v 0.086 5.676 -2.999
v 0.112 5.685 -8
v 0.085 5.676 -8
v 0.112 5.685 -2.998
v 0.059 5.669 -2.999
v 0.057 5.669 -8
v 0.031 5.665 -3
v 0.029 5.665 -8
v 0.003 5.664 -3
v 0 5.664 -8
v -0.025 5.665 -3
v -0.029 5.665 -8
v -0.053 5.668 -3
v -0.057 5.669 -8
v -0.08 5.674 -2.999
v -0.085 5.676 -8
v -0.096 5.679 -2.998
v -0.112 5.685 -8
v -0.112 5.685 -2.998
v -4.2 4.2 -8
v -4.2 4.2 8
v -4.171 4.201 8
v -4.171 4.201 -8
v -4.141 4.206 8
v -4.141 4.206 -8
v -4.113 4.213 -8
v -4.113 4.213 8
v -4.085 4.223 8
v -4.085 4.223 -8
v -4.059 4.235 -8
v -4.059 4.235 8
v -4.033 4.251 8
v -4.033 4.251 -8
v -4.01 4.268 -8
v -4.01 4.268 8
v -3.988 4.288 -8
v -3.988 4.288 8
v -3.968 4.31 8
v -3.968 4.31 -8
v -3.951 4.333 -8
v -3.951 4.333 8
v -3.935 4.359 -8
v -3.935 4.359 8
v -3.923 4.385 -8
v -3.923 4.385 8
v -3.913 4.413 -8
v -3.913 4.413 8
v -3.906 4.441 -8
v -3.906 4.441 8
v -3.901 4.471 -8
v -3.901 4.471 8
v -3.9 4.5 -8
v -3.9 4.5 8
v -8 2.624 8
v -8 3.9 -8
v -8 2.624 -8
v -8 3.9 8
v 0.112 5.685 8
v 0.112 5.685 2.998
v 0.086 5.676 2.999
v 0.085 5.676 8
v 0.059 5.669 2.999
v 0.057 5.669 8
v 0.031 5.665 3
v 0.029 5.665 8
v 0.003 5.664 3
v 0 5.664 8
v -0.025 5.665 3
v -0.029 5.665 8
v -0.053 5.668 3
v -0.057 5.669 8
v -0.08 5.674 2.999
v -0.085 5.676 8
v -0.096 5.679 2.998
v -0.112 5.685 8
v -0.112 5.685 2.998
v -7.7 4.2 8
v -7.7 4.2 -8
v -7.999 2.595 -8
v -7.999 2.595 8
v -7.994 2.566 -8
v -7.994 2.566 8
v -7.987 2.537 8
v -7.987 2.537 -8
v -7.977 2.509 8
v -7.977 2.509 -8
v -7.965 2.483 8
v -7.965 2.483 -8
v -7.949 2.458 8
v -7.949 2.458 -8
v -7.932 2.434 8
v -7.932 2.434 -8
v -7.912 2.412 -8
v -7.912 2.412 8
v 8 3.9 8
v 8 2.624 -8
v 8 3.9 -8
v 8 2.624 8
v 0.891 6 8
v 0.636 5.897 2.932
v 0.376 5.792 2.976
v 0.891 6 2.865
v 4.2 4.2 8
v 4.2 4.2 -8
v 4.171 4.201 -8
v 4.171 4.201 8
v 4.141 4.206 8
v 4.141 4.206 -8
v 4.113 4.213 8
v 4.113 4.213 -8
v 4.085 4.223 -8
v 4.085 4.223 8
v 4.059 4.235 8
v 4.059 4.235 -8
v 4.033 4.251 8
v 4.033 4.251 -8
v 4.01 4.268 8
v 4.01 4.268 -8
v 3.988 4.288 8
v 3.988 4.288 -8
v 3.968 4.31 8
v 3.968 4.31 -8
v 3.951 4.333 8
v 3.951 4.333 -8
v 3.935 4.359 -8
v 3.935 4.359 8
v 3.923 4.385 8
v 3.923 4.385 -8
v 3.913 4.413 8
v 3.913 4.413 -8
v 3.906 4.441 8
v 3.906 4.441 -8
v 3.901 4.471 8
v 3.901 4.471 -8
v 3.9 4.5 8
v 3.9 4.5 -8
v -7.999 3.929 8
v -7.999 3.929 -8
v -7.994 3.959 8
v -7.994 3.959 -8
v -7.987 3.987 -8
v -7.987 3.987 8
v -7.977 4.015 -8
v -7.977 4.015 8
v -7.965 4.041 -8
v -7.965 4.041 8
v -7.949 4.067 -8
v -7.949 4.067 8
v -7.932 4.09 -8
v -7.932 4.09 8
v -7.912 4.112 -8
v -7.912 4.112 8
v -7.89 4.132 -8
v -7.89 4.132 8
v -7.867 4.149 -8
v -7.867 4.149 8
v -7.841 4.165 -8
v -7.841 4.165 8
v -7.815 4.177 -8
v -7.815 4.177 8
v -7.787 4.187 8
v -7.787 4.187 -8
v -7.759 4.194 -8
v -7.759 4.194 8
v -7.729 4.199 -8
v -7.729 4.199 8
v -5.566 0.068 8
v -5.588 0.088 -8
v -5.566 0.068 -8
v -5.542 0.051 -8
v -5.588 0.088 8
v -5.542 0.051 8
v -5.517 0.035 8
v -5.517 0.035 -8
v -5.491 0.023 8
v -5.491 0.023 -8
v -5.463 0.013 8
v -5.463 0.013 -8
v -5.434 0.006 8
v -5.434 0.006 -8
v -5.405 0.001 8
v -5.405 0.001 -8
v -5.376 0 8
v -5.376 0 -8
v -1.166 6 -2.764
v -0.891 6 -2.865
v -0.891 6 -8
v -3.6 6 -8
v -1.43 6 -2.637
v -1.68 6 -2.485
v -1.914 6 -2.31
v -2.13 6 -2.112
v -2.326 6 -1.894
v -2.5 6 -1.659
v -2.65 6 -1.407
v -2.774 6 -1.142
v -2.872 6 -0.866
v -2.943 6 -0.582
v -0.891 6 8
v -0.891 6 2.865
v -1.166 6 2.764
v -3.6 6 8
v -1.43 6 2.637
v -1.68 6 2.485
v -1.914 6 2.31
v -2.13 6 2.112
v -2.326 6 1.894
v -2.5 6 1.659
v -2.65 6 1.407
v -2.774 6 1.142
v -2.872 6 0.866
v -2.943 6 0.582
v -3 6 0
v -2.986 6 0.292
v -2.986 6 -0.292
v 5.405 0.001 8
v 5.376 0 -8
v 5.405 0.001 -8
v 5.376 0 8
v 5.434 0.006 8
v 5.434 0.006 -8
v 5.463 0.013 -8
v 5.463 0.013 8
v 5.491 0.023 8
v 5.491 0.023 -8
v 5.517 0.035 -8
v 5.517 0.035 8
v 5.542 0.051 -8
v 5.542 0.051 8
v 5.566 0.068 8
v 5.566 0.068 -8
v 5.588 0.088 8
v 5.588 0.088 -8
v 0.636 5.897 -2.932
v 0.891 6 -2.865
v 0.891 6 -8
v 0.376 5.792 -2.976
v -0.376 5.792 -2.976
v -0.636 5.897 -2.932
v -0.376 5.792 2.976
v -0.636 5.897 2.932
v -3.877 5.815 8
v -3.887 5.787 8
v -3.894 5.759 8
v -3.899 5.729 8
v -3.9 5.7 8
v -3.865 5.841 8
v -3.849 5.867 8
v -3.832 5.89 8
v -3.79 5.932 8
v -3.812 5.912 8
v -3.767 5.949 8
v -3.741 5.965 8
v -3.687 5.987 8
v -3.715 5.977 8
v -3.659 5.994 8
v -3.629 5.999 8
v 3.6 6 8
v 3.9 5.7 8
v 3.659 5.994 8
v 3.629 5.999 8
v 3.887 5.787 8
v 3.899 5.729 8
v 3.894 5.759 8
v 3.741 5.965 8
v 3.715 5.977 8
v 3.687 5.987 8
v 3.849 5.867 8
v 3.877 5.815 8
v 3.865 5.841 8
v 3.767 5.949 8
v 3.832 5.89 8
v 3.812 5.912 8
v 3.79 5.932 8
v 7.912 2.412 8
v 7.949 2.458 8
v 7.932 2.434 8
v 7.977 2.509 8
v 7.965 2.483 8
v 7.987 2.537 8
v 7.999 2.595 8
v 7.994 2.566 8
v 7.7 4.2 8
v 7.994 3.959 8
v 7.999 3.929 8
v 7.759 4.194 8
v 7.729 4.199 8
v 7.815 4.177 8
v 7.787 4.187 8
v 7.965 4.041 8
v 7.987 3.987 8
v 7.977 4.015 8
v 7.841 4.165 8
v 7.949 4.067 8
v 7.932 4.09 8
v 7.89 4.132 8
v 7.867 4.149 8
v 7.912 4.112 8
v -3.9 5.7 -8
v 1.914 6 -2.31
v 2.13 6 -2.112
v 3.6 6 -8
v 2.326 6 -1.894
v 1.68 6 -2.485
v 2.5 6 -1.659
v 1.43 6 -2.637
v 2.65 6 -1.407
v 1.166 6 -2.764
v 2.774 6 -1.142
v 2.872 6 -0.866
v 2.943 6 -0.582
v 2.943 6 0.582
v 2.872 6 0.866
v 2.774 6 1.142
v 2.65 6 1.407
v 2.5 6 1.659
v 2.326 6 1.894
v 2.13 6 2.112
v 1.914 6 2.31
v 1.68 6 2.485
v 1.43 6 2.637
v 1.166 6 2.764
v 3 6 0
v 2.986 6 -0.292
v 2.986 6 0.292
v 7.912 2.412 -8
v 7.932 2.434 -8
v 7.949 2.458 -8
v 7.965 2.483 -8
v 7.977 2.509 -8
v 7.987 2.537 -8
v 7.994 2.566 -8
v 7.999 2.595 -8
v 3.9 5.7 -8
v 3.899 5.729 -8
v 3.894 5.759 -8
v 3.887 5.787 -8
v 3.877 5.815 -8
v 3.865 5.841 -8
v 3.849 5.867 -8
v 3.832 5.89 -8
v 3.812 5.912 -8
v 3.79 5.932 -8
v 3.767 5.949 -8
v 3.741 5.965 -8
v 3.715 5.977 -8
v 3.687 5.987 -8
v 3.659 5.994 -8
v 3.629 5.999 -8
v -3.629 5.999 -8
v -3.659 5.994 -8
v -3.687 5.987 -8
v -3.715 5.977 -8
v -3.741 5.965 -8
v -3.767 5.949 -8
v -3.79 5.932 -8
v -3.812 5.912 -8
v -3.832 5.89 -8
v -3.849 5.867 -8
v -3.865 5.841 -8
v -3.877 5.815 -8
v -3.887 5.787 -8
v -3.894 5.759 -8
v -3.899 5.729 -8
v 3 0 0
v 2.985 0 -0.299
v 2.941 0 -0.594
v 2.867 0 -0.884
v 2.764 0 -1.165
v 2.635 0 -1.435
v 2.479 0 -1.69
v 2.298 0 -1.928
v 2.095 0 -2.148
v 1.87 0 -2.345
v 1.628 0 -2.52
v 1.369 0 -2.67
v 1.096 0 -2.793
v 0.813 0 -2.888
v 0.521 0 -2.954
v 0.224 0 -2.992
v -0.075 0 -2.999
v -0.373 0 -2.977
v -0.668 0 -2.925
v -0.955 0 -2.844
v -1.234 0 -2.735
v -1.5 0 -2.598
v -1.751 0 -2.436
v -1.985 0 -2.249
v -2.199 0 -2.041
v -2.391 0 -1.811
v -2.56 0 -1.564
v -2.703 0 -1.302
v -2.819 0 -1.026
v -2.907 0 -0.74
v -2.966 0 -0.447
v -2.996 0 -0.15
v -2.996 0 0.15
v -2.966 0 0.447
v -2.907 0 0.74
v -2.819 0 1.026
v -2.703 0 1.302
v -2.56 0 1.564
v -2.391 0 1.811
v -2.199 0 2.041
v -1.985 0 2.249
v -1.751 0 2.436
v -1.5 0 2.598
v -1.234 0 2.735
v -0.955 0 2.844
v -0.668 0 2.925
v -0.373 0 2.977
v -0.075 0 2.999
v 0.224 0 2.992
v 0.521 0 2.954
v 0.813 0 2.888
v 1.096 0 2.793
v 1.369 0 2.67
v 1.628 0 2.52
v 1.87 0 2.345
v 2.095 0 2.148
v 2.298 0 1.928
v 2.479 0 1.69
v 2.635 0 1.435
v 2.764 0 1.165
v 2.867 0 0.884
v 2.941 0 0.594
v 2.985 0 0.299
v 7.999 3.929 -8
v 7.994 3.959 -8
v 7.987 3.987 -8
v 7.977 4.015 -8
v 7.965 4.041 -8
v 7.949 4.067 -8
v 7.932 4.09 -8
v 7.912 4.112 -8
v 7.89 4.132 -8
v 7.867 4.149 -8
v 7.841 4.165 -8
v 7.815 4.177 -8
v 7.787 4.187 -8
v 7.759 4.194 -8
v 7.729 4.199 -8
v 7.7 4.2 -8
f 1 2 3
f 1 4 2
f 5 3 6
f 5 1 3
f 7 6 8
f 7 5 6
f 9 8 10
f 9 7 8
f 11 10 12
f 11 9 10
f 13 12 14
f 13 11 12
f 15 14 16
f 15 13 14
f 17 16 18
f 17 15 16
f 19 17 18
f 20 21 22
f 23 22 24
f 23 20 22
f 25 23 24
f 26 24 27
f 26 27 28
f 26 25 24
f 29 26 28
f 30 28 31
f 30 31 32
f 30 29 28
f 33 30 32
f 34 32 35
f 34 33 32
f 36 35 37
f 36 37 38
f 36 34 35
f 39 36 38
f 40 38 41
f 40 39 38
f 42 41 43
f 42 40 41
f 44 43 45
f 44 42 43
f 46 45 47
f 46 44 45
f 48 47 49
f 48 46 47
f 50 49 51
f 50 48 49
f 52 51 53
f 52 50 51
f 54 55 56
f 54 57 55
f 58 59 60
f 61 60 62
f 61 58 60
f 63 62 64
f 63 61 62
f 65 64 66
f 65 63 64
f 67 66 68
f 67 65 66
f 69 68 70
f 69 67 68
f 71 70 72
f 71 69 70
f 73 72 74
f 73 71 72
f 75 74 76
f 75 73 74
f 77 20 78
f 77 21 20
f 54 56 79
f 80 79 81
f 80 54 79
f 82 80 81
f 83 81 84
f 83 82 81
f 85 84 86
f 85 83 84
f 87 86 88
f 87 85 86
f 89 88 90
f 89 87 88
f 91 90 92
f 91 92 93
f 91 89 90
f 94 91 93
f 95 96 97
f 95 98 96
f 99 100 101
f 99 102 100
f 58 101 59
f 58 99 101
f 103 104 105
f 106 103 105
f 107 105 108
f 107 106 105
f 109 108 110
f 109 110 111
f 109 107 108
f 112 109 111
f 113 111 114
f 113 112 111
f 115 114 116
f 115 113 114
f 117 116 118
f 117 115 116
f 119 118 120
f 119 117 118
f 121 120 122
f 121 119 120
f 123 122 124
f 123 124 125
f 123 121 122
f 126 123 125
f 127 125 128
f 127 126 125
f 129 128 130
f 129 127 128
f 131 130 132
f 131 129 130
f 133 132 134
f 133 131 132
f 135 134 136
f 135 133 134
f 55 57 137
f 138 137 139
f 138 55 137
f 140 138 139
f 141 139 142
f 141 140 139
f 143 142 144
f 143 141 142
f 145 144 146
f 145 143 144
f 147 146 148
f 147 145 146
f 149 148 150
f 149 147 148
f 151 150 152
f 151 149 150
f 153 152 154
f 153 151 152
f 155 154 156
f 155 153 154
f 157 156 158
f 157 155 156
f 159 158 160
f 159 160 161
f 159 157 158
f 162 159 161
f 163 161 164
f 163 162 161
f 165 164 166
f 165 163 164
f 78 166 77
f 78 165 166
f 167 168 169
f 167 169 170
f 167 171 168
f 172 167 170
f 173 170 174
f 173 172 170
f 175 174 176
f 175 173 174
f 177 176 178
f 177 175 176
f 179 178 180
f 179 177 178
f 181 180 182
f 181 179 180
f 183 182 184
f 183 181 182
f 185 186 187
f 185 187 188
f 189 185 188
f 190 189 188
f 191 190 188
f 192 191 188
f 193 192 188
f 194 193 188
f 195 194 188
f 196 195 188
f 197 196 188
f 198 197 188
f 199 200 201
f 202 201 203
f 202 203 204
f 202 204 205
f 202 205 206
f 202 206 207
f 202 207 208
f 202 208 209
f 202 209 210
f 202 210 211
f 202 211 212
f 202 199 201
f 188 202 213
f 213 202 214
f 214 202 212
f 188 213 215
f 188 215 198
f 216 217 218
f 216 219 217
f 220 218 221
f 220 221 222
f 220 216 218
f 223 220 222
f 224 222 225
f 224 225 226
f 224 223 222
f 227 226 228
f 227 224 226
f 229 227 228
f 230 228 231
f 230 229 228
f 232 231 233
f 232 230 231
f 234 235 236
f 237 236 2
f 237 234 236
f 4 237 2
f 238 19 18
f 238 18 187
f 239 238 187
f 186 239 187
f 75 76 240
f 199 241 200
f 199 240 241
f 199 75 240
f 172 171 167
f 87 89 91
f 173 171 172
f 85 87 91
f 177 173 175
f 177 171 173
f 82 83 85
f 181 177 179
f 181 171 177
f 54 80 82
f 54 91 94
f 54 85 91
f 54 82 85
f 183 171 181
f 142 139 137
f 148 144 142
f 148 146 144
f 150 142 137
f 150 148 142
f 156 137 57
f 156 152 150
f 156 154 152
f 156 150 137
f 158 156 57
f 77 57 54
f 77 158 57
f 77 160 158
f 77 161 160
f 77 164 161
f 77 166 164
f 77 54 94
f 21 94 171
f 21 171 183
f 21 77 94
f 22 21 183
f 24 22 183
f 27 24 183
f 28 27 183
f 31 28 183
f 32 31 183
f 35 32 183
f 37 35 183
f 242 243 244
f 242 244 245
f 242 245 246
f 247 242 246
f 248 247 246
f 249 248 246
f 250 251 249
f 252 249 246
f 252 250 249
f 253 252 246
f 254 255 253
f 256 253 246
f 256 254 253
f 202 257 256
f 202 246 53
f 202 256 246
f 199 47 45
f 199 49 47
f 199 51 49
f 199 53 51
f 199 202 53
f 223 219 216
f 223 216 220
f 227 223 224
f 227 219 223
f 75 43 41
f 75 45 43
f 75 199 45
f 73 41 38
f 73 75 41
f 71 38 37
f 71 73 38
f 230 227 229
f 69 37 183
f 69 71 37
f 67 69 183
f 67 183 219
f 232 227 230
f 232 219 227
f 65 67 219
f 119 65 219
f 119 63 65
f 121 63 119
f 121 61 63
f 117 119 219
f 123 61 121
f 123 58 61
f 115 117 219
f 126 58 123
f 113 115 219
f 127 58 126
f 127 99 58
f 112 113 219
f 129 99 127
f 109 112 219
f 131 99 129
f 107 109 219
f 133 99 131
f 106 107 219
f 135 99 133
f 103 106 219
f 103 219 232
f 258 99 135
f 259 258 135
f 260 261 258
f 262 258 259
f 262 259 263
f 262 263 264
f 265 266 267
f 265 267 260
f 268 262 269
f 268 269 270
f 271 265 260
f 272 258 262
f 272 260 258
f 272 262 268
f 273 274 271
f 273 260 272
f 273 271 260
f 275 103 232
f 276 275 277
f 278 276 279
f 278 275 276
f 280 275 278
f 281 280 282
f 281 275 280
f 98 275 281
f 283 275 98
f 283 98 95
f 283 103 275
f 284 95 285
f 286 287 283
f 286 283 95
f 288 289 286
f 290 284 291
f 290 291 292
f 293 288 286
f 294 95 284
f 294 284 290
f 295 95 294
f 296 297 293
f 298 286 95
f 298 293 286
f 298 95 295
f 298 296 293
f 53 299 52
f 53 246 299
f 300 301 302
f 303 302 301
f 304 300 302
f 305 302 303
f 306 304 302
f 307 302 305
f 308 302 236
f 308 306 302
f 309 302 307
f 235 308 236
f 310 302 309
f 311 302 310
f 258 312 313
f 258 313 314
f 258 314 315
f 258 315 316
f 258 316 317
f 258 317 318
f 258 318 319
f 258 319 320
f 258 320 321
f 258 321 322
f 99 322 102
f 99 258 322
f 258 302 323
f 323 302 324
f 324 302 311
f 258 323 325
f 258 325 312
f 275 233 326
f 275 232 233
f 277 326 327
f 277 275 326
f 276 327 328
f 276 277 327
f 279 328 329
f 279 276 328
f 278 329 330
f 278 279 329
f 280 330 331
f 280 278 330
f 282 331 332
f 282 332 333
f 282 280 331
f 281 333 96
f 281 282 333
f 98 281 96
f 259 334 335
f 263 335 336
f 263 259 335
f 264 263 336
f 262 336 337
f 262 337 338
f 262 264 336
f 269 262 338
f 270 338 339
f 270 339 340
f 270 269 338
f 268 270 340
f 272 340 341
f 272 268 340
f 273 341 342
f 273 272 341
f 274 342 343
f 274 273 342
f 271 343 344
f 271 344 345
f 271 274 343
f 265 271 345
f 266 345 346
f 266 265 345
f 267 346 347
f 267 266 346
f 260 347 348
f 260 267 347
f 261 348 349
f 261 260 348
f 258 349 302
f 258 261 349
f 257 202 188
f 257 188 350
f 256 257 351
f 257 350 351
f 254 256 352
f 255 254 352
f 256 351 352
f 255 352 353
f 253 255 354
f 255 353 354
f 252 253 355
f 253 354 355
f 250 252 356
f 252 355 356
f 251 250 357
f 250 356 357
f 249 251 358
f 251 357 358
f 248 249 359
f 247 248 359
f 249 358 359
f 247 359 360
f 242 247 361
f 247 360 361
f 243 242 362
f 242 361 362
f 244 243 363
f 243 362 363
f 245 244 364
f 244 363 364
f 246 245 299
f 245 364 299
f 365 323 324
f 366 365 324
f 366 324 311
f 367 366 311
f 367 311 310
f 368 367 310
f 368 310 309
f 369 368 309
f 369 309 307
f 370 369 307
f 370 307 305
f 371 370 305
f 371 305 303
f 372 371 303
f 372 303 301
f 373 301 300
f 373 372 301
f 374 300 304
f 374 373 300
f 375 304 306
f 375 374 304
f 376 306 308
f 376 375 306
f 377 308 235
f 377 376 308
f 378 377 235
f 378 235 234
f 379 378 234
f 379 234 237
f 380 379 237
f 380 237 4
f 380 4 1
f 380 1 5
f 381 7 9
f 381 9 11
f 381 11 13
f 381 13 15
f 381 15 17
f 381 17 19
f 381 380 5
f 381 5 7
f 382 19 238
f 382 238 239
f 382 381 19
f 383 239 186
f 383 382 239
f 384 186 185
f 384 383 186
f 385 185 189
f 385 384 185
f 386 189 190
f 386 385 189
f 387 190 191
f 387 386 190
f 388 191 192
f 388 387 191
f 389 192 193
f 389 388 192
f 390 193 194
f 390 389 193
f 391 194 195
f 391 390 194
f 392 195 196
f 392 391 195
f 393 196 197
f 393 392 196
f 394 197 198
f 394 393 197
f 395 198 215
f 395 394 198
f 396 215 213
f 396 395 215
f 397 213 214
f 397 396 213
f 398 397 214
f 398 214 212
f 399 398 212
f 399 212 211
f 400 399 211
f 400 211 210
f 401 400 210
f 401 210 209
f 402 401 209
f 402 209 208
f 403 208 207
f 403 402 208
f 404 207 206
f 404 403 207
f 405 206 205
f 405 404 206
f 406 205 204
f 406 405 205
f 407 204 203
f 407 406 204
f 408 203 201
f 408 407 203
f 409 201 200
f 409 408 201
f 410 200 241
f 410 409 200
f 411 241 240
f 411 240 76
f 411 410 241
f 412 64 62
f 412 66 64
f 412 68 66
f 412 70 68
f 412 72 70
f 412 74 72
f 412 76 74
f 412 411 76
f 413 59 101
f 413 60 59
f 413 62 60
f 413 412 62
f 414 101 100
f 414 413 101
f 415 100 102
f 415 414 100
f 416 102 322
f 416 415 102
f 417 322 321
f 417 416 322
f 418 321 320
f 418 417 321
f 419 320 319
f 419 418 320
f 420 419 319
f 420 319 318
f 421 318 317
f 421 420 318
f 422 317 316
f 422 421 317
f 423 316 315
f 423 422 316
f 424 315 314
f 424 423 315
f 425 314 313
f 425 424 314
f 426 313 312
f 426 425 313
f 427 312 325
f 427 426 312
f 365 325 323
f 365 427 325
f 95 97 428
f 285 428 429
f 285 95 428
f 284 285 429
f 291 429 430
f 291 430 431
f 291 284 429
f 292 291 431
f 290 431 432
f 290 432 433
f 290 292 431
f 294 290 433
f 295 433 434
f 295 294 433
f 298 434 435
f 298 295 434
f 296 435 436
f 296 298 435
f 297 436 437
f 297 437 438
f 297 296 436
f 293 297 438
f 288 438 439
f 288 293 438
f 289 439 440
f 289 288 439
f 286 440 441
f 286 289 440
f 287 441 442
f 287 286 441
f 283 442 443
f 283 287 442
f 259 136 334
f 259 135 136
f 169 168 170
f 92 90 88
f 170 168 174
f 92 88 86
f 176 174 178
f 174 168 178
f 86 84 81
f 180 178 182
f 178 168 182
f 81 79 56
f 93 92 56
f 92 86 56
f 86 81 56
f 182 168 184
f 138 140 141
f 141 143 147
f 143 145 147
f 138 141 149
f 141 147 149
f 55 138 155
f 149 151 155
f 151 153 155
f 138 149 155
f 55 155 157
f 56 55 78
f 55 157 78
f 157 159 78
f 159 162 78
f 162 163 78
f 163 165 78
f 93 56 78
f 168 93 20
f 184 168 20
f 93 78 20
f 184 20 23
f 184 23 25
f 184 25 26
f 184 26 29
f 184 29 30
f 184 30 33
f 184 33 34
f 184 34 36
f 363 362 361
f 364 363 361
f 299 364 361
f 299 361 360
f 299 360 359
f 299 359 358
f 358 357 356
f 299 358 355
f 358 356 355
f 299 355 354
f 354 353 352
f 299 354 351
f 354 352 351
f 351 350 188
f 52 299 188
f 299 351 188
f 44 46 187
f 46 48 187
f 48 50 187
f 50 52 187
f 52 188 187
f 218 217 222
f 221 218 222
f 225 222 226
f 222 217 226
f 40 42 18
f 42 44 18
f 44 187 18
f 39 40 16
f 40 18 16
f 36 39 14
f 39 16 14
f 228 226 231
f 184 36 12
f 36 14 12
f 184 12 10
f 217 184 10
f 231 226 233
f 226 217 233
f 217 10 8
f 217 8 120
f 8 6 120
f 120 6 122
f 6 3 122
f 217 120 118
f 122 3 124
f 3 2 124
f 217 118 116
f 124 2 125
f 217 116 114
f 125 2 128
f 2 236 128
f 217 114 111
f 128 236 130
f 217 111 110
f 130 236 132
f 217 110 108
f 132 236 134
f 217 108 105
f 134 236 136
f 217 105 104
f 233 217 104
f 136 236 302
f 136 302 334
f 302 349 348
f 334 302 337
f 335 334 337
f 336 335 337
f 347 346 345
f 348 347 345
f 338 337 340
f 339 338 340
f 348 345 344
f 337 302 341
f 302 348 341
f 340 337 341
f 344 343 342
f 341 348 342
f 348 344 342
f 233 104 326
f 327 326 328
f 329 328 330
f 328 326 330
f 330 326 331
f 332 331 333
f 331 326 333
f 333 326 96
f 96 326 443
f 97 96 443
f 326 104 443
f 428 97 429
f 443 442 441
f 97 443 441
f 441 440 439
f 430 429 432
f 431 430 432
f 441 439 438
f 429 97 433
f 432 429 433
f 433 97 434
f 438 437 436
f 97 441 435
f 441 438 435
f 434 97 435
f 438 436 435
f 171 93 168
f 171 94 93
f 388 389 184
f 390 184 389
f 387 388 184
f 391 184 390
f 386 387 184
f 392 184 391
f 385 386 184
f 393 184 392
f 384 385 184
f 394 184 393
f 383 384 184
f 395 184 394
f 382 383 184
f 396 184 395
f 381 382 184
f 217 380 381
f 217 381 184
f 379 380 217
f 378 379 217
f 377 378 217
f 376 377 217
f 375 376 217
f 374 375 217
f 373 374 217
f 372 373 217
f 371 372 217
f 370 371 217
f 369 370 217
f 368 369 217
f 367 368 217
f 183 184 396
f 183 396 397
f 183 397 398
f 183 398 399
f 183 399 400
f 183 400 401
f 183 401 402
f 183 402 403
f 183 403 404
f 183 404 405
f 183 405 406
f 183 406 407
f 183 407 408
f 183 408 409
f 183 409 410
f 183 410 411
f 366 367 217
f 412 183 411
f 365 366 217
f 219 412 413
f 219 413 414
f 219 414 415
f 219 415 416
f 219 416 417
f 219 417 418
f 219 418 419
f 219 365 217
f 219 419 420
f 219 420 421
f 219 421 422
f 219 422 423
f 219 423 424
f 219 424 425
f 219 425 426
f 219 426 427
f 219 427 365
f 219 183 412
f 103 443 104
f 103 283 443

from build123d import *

# Parameters (mm, degrees)
BOSS_EXTRUDE1_DEPTH      = 8
BOSS_EXTRUDE1_DEPTH_BACK = 8
SKETCH9_R                = 3
CUT_EXTRUDE2_DEPTH       = 7
FILLET1_R                = 0.3


with BuildPart() as part:
    # Sketch4 → Boss-Extrude1 (new body, two sides)
    with BuildSketch(Plane.XY) as boss_extrude1_sk:
        Polygon((-8, 4.2), (-8, 2.5), (-5.5, 0), (5.5, 0), (8, 2.5), (8, 4.2), (3.9, 4.2), (3.9, 6), (0.891031267, 6), (0, 5.64), (-0.891031267, 6), (-3.9, 6), (-3.9, 4.2), align=None)
    extrude(amount=BOSS_EXTRUDE1_DEPTH)
    extrude(boss_extrude1_sk.sketch, amount=-BOSS_EXTRUDE1_DEPTH_BACK)

    # Sketch9 → Cut-Extrude2 (cut, through all)
    with BuildSketch(Plane(origin=(0, 0, 0), x_dir=(1, 0, 0), z_dir=(0, 1, 0))):
        Circle(SKETCH9_R)
    extrude(amount=CUT_EXTRUDE2_DEPTH, mode=Mode.SUBTRACT)

    # Fillet1
    fillet1_edges = [part.edges().sort_by_distance(p)[0] for p in [
        (-3.9, 6, 0),
        (-3.9, 4.2, 0),
        (-8, 4.2, 0),
        (-8, 2.5, 0),
        (-5.5, 0, 0),
        (5.5, 0, 0),
        (8, 2.5, 0),
        (8, 4.2, 0),
        (3.9, 4.2, 0),
        (3.9, 6, 0),
        (0, 5.64, -5.5),
        (0, 5.64, 5.5),
    ]]
    fillet(fillet1_edges, radius=FILLET1_R)


solid = part.part
